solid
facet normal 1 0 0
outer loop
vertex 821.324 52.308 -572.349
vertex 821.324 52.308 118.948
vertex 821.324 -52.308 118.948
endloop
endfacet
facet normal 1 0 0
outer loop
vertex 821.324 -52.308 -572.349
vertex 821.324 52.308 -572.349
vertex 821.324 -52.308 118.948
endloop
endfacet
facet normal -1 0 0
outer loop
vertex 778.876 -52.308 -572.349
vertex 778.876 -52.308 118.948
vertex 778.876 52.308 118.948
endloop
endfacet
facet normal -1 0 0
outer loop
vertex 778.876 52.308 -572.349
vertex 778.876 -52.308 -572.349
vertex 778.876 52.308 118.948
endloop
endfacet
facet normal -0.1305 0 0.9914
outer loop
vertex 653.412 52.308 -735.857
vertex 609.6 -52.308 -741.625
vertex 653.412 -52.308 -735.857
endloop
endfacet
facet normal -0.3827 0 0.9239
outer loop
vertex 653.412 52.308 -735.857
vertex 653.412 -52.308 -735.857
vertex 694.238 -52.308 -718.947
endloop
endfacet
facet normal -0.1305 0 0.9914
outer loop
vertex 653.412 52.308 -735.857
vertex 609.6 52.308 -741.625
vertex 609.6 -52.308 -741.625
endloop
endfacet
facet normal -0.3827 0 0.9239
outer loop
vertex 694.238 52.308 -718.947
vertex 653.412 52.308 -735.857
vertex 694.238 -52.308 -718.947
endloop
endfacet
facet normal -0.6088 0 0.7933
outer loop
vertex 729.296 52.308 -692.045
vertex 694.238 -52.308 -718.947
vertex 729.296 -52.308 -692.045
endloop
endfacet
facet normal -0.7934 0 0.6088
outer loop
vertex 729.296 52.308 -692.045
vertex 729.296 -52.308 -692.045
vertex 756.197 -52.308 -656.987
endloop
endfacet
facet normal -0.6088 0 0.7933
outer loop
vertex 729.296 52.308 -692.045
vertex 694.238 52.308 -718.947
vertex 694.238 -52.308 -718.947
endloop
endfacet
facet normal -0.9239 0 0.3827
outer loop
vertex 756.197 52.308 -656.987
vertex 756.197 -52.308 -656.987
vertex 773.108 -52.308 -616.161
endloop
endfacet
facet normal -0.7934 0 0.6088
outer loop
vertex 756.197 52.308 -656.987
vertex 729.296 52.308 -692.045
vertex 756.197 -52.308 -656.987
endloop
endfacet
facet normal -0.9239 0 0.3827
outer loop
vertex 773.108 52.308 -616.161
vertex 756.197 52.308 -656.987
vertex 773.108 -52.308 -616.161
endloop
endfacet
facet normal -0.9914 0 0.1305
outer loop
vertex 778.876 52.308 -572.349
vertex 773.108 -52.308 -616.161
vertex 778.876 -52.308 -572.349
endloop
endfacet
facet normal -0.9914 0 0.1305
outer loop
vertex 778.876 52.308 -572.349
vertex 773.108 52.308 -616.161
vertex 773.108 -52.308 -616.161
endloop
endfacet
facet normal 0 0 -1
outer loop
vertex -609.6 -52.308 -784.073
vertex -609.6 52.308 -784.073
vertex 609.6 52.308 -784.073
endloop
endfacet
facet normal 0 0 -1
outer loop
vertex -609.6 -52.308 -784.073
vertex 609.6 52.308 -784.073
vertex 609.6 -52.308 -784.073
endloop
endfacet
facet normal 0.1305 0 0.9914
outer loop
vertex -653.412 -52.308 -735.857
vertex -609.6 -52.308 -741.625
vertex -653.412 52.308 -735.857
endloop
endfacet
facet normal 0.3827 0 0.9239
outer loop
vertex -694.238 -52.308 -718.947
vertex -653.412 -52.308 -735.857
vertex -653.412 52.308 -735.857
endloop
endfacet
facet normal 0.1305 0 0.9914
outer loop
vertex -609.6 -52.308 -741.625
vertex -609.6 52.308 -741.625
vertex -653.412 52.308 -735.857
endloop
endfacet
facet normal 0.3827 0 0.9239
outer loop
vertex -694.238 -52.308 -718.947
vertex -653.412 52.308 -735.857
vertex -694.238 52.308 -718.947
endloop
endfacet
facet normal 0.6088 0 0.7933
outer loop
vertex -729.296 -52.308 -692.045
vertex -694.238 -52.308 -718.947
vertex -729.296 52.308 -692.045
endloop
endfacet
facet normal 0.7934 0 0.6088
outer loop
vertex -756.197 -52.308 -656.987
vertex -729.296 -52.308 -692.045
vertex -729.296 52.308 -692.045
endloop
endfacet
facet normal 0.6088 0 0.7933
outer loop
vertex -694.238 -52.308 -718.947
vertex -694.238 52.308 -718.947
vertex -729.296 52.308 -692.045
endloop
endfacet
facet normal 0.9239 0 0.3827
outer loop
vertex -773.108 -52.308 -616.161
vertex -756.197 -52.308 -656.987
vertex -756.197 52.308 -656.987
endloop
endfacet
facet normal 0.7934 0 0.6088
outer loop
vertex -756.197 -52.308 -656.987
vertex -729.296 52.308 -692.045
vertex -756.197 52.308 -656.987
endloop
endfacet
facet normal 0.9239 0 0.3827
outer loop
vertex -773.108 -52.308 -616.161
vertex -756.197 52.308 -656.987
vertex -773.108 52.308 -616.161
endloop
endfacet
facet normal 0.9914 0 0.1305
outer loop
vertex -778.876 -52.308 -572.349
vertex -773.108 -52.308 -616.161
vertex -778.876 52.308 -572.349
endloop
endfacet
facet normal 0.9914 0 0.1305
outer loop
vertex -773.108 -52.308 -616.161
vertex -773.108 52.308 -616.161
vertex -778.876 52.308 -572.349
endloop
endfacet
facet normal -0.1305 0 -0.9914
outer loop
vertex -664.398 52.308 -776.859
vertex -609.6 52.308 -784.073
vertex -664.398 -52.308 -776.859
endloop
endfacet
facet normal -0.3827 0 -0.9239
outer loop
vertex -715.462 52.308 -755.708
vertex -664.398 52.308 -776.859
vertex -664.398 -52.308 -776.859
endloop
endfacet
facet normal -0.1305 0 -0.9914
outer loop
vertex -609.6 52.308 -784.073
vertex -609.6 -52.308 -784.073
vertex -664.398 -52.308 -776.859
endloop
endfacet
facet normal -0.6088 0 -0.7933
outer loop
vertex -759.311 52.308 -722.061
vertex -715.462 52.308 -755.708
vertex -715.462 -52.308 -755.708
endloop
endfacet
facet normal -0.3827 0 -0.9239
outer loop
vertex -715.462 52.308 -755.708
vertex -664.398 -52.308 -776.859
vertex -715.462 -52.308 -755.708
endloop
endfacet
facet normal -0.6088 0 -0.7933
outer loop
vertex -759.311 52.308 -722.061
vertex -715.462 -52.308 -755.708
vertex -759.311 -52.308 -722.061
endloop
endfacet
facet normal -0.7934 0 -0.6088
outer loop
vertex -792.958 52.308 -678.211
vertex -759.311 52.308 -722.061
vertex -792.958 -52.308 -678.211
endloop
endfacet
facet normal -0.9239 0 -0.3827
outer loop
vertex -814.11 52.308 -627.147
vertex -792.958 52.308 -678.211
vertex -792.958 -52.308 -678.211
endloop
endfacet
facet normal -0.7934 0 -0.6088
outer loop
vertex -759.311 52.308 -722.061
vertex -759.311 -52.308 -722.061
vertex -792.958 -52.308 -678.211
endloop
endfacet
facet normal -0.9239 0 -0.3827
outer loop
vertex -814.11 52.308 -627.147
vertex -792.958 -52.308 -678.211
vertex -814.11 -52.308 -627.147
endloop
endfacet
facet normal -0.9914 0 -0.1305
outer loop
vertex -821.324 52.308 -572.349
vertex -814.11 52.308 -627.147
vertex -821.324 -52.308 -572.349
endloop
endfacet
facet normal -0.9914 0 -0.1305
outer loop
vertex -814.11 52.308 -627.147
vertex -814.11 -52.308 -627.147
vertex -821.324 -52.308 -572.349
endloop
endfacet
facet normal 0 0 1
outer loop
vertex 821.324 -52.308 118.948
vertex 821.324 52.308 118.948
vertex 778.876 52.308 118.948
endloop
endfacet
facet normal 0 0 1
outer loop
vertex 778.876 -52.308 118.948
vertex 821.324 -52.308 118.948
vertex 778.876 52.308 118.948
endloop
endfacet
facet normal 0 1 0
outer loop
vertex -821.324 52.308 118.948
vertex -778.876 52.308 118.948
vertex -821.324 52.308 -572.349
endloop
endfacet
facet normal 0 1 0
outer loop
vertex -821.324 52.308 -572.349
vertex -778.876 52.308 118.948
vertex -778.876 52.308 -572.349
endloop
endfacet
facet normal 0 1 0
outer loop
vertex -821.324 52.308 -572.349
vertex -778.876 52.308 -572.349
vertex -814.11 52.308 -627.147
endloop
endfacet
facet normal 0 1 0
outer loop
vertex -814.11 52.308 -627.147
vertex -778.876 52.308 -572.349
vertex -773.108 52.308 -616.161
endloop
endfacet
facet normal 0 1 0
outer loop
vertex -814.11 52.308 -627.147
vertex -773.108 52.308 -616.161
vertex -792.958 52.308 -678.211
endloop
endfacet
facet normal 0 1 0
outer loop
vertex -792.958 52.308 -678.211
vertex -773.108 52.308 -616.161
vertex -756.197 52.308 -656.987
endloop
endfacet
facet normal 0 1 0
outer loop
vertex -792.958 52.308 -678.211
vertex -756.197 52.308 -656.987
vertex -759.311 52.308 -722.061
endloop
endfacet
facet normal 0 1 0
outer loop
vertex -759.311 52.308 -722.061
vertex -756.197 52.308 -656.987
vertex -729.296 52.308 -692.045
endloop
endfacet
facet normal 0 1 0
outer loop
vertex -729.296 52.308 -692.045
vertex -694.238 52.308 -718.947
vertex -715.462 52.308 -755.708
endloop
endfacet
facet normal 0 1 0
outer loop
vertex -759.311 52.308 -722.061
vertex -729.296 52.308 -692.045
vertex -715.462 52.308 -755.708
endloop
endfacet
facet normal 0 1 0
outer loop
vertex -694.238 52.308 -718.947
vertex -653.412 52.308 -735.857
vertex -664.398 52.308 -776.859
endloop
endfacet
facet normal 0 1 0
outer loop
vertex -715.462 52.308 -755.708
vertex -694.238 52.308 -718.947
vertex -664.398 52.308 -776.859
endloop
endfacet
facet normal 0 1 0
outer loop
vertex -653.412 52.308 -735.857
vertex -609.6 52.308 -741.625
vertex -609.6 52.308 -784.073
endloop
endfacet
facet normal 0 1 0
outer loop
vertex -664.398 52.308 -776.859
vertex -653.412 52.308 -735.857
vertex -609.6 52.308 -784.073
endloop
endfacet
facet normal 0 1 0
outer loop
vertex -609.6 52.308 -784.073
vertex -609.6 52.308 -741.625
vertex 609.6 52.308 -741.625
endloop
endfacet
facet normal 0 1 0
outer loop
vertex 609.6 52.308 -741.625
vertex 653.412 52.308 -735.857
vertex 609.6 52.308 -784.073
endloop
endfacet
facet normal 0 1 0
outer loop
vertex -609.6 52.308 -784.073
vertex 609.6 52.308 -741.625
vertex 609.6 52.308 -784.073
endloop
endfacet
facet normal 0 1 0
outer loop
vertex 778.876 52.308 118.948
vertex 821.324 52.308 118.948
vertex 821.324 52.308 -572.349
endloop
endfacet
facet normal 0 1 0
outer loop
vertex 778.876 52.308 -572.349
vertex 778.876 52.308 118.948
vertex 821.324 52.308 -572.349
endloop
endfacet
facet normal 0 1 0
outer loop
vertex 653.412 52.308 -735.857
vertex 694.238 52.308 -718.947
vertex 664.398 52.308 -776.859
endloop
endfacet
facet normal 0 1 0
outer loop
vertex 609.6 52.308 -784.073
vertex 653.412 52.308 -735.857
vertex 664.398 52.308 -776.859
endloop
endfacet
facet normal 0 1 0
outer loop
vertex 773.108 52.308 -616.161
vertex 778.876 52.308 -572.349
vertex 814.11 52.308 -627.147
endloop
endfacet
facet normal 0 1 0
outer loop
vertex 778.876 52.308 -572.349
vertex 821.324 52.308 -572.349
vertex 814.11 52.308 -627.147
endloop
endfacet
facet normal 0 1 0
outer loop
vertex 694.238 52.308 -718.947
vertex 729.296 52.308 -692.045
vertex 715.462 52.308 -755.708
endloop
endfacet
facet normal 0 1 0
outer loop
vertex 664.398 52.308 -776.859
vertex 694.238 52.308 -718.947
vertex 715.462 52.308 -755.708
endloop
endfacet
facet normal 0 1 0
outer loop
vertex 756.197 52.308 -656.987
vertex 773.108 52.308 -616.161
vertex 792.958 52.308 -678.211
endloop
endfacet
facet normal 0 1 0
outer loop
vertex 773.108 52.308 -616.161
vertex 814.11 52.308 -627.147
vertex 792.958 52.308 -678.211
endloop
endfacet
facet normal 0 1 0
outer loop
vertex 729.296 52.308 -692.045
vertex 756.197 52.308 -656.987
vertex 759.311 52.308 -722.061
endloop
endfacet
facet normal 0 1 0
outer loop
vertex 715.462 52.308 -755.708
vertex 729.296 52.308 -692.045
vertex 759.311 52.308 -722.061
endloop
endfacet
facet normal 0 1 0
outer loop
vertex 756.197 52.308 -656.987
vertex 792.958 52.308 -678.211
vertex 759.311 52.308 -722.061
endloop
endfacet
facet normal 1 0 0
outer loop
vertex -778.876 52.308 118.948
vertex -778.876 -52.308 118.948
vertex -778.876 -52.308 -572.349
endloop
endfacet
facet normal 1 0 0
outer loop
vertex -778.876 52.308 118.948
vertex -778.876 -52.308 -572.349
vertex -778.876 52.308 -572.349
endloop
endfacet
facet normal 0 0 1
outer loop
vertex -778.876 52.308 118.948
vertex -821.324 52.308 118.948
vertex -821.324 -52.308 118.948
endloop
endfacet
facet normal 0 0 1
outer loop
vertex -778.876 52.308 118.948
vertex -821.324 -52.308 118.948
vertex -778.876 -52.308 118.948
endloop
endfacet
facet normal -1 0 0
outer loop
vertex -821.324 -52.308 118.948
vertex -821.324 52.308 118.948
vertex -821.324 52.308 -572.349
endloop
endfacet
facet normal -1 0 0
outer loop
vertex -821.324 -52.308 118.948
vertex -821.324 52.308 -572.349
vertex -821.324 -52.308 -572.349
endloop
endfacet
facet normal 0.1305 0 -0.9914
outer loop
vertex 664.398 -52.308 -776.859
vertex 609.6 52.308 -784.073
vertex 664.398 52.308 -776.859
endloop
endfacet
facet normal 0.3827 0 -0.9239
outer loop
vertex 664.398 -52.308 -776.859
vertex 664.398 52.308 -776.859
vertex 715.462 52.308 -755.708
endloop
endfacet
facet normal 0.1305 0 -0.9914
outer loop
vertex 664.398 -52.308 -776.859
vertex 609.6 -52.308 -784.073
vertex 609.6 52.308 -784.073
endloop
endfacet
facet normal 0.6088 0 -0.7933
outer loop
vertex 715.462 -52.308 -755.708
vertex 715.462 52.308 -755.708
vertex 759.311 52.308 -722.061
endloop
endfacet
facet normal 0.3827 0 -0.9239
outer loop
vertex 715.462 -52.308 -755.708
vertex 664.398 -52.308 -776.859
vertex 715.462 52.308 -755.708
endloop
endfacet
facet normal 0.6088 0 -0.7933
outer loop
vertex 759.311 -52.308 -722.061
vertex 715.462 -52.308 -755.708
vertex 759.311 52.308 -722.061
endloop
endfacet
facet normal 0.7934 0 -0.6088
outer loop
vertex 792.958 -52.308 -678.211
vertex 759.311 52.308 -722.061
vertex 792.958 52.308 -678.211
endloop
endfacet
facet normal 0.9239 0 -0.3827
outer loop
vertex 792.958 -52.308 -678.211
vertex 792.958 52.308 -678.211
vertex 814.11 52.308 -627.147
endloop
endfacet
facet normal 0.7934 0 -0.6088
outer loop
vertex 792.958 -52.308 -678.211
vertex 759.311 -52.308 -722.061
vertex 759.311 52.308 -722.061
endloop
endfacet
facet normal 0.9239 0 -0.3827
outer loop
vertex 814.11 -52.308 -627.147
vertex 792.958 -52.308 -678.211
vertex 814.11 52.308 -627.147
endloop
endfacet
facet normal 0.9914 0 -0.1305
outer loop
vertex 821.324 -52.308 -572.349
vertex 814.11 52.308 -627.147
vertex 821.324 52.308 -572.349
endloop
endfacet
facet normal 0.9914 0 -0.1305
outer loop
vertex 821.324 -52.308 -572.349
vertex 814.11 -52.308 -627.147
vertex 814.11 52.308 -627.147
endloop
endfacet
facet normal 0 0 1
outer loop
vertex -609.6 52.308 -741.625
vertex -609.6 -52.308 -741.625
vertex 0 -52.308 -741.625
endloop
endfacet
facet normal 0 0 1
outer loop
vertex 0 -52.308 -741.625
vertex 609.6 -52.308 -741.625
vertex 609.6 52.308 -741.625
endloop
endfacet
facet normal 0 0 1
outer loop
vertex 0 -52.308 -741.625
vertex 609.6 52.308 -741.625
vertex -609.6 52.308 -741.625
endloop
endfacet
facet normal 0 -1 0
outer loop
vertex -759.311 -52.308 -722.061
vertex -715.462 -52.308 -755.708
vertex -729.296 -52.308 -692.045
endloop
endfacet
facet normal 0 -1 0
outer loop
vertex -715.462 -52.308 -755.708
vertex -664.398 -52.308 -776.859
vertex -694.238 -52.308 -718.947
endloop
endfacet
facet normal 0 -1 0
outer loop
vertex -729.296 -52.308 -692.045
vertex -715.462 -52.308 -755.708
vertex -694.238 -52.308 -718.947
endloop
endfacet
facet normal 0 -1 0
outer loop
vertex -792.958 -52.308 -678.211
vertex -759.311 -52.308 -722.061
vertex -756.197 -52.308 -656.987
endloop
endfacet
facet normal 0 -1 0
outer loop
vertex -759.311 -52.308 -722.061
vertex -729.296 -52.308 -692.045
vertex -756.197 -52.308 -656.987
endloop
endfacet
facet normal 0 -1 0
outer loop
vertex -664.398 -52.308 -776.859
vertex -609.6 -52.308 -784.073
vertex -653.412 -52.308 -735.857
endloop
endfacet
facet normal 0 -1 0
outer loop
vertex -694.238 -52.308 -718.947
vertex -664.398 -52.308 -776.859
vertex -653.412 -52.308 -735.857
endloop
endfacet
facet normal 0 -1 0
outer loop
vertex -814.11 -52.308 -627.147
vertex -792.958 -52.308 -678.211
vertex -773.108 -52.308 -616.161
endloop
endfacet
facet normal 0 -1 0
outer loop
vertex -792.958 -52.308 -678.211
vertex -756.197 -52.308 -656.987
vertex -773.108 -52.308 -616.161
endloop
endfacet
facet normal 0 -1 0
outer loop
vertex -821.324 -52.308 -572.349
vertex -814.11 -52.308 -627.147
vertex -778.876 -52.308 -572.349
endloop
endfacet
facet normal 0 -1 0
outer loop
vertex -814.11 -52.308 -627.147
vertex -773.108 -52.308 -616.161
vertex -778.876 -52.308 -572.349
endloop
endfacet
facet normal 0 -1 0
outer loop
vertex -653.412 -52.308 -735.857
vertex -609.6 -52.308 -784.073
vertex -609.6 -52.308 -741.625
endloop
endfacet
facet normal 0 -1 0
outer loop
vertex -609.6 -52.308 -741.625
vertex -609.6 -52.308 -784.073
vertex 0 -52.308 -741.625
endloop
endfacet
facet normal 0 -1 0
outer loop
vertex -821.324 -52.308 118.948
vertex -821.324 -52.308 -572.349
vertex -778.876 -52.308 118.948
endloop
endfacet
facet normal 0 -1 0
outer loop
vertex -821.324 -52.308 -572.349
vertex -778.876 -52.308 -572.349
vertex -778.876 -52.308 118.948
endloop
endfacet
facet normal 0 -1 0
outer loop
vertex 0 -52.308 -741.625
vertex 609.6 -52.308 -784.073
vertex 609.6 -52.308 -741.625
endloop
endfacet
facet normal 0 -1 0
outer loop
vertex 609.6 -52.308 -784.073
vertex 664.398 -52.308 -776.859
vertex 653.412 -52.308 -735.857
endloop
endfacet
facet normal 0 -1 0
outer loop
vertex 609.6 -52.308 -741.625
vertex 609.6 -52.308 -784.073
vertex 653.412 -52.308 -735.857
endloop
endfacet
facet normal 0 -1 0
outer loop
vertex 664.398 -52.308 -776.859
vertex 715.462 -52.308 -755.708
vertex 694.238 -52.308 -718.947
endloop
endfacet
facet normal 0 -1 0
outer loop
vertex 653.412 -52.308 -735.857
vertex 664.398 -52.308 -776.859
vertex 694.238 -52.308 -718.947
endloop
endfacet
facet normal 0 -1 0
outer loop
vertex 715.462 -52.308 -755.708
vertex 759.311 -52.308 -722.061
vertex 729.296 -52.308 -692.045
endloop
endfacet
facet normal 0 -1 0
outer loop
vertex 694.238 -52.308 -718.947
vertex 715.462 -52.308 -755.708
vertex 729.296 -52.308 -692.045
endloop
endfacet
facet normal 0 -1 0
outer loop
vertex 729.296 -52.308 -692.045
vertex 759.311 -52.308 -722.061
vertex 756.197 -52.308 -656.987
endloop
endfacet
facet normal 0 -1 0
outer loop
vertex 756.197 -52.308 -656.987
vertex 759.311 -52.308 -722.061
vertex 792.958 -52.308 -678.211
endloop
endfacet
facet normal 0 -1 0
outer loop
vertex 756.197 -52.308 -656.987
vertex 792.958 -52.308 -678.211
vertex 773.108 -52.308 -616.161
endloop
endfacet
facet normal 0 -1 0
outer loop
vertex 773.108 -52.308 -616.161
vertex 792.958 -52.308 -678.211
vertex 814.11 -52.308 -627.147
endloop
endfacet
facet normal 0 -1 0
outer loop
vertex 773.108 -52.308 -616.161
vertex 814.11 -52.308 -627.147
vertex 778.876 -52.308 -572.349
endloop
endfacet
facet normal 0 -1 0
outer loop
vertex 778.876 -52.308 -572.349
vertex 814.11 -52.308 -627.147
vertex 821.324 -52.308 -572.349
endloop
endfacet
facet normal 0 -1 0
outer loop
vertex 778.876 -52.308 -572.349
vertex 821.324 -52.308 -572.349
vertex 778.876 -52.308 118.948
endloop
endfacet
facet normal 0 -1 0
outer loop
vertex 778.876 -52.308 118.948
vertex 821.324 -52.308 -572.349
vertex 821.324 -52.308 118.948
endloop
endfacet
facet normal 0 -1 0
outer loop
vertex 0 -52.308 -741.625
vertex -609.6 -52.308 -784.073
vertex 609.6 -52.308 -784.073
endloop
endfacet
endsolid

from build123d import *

# Parameters (mm, degrees)
SKETCH2_W = 42.447903748
SKETCH2_H = 104.615154758


with BuildPart() as part:
    # Sweep1: sweep along a path in Sketch1
    with BuildLine(Plane(origin=(0, 0, 0), x_dir=(1, 0, 0), z_dir=(0, 1, 0))) as sweep1_path:
        Line((0, 762.84918933), (-609.6, 762.84918933))
        ThreePointArc((-609.6, 762.84918933), (-744.303841816, 707.053031146), (-800.1, 572.34918933))
        Line((-800.1, 572.34918933), (-800.1, -118.947967944))
    # Sketch2 → Sweep1 (sweep)
    with BuildSketch(Plane(origin=(-800.1, 0, 118.947967944), x_dir=(1, 0, 0), z_dir=(0, 0, 1))):
        Rectangle(SKETCH2_W, SKETCH2_H)
    sweep1 = sweep(path=sweep1_path.line)

    # Mirror1: Sweep1 across plane
    add(sweep1.mirror(Plane(origin=(0, 0, 37.25081067), x_dir=(0, 0, 1), z_dir=(1, 0, 0))))


solid = part.part
